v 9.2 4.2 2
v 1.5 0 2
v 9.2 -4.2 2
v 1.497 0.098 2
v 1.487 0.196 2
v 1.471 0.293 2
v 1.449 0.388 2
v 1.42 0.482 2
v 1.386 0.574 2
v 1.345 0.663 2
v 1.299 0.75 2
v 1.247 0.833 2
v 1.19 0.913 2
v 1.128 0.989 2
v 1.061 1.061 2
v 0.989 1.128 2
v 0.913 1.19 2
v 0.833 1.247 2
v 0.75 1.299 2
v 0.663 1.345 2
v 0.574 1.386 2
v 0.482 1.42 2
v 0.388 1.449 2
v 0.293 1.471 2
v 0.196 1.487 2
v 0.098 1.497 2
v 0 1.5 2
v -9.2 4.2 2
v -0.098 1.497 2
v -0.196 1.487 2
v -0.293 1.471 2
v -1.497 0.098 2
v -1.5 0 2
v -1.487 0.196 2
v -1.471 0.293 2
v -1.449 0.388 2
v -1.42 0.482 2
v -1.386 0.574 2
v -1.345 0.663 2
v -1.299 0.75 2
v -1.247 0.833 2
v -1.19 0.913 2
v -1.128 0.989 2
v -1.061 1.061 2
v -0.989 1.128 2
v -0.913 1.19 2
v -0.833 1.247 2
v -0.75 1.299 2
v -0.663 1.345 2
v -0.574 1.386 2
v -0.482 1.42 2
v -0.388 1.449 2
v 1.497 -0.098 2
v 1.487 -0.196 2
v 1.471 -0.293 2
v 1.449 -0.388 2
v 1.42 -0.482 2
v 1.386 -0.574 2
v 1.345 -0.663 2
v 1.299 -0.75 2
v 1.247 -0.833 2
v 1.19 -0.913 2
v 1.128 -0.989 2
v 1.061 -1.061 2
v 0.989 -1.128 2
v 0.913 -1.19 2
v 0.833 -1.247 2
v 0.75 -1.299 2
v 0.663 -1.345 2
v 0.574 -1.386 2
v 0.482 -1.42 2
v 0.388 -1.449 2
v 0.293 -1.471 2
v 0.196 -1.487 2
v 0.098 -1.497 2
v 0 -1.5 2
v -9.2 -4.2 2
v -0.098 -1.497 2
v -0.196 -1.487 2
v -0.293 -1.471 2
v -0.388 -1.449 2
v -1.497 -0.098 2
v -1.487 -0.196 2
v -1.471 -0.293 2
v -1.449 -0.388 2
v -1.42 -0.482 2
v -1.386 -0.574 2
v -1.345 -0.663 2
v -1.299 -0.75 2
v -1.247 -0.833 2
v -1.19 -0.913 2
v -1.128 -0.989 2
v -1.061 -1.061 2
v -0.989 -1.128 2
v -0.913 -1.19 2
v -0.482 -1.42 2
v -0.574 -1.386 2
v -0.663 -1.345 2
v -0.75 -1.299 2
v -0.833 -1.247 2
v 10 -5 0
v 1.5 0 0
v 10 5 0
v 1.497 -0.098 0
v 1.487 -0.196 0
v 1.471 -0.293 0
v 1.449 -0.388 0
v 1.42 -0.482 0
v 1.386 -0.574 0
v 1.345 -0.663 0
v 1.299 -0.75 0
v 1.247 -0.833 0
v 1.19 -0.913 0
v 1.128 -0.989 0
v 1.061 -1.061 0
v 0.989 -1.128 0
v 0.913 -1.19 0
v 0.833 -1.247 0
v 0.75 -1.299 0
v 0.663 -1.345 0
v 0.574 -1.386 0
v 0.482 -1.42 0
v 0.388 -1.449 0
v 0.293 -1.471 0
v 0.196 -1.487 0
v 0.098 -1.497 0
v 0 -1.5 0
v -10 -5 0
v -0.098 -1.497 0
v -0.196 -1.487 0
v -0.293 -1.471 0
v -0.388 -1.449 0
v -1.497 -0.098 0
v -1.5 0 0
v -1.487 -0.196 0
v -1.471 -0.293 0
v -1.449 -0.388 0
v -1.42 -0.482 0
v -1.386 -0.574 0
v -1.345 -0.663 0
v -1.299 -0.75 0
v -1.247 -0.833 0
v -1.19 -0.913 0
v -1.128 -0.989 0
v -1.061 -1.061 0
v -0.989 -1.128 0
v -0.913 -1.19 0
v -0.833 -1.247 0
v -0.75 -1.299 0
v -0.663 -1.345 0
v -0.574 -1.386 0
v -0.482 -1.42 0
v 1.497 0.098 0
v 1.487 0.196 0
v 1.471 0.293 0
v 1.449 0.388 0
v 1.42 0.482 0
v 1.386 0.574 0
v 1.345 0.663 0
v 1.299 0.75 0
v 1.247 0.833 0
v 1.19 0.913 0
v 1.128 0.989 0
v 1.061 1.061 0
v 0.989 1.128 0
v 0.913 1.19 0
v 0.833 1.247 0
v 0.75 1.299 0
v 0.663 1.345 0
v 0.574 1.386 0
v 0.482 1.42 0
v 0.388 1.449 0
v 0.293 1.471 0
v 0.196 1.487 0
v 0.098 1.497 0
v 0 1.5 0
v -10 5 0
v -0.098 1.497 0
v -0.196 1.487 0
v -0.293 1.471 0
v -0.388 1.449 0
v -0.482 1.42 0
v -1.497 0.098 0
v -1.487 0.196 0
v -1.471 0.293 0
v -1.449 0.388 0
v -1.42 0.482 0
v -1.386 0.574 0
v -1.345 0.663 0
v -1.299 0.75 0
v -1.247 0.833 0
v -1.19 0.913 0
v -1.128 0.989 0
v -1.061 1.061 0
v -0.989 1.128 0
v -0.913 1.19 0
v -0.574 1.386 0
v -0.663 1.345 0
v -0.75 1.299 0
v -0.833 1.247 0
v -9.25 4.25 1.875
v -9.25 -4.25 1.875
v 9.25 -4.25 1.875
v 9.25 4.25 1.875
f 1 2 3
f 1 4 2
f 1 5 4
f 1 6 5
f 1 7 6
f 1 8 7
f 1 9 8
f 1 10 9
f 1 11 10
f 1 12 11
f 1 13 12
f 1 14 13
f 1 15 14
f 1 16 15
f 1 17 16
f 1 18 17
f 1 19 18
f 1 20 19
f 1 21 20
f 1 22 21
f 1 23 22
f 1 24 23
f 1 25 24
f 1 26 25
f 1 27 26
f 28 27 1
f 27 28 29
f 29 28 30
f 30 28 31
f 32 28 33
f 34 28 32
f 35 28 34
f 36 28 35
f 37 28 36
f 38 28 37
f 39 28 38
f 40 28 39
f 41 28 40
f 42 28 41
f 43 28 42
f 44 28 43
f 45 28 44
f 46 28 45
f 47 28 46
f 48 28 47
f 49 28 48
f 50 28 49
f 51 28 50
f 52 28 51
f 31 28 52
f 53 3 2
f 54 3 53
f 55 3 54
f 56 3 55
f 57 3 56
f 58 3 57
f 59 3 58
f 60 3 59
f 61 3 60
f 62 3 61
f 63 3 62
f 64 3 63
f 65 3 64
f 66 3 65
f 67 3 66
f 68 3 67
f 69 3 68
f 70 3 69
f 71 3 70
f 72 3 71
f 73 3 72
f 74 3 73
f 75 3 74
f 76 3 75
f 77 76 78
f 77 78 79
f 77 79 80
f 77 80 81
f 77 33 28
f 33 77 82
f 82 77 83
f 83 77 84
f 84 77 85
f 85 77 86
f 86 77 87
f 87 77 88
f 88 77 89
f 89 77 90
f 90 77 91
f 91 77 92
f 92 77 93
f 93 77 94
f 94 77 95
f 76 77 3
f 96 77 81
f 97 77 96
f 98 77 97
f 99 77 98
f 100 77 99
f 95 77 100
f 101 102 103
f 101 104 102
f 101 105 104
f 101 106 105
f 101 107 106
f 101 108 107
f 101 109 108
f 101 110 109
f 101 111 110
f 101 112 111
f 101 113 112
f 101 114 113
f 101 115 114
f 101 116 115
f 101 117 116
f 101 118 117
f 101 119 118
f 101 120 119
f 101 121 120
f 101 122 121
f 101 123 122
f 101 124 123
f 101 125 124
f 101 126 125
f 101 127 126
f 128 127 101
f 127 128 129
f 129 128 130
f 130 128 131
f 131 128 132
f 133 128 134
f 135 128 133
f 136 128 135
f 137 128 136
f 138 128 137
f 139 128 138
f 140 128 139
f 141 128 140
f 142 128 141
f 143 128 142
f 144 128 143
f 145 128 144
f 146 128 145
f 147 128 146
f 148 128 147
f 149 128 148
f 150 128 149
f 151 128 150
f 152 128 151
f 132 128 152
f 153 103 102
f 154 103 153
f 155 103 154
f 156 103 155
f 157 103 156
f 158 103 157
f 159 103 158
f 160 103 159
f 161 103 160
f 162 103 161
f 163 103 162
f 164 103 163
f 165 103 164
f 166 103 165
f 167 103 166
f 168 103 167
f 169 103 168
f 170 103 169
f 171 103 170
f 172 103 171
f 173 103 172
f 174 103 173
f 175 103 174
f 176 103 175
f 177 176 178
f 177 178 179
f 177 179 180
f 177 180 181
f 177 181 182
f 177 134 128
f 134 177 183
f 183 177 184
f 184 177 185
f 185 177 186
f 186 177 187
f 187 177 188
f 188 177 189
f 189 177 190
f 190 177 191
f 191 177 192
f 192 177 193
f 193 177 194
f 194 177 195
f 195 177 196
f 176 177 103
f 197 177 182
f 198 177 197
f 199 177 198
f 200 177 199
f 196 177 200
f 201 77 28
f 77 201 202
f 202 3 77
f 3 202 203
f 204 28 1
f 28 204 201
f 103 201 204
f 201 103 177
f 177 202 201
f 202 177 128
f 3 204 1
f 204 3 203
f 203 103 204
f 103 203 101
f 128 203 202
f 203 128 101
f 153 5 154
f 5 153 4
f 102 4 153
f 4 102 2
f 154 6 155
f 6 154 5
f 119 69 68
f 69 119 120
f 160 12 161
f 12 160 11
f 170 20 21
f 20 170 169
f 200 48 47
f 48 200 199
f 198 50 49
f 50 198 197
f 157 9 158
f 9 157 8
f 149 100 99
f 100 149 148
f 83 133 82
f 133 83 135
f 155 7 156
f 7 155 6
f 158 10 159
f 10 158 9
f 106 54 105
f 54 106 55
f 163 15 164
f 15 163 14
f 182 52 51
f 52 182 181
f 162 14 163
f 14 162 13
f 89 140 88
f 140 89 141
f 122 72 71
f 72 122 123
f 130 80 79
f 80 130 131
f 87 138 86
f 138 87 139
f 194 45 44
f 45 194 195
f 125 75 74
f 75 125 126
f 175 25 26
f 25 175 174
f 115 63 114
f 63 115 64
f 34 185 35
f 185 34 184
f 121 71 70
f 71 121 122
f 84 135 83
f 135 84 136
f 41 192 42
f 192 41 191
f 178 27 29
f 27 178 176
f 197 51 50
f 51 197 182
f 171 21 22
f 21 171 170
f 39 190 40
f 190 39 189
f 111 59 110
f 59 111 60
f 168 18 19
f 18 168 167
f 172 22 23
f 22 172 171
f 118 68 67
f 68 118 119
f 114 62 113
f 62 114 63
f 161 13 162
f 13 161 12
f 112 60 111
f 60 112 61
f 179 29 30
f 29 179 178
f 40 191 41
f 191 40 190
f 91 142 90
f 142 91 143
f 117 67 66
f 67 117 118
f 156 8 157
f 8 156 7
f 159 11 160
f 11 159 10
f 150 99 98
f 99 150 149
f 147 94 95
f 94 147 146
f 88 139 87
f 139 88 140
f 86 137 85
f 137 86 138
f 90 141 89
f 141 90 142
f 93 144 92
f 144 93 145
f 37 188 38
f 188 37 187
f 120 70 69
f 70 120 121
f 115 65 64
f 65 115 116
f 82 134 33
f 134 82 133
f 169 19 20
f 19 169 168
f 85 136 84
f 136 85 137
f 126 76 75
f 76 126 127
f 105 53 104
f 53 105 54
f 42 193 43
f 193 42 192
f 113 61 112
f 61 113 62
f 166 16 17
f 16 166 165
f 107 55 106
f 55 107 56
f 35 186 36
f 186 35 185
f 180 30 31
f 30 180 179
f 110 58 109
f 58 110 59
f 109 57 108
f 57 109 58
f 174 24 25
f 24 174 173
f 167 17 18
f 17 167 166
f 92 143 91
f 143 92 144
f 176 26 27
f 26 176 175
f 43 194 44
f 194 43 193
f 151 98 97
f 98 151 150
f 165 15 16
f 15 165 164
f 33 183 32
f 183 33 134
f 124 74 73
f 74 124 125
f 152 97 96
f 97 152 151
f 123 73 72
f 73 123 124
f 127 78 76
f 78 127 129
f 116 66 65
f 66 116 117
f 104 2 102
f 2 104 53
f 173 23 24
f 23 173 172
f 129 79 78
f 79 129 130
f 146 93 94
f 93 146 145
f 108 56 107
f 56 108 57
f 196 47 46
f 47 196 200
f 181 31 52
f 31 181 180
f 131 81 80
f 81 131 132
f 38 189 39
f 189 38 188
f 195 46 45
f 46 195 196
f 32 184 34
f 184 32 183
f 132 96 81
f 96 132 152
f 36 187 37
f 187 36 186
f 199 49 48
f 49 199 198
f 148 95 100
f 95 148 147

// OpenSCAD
// Auto-generated from tests/data/feature_fixtures_manifest.json
// fixture: plate_chamfered_with_hole
// fixture_type: plate
// description: Chamfered-edge plate with a single centered hole. Combines chamfer and hole detection.
$fn = 96;

plate_size = [20.000000, 10.000000, 2.000000];
plate_origin = [-10.000000, -5.000000, 0.000000];

module through_hole(center, diameter, height) {
  translate(center) cylinder(d=diameter, h=height, center=false);
}

module through_slot(start, end, width, height) {
  hull() {
    through_hole(start, width, height);
    through_hole(end, width, height);
  }
}

module counterbore_hole(center, through_d, bore_d, bore_depth, plate_thickness) {
  translate([center[0], center[1], -0.1])
    cylinder(d=through_d, h=plate_thickness + 0.2, center=false);
  translate([center[0], center[1], plate_thickness - bore_depth])
    cylinder(d=bore_d, h=bore_depth + 0.1, center=false);
}

plate_edge_chamfer = 0.800000;
plate_top_scale = [0.920000, 0.840000];

difference() {
  linear_extrude(height=plate_size[2], scale=plate_top_scale) square([plate_size[0], plate_size[1]], center=true);
  through_hole([0.000000, 0.000000, -0.100000], 3.000000, 2.200000);  // hole_0
}
